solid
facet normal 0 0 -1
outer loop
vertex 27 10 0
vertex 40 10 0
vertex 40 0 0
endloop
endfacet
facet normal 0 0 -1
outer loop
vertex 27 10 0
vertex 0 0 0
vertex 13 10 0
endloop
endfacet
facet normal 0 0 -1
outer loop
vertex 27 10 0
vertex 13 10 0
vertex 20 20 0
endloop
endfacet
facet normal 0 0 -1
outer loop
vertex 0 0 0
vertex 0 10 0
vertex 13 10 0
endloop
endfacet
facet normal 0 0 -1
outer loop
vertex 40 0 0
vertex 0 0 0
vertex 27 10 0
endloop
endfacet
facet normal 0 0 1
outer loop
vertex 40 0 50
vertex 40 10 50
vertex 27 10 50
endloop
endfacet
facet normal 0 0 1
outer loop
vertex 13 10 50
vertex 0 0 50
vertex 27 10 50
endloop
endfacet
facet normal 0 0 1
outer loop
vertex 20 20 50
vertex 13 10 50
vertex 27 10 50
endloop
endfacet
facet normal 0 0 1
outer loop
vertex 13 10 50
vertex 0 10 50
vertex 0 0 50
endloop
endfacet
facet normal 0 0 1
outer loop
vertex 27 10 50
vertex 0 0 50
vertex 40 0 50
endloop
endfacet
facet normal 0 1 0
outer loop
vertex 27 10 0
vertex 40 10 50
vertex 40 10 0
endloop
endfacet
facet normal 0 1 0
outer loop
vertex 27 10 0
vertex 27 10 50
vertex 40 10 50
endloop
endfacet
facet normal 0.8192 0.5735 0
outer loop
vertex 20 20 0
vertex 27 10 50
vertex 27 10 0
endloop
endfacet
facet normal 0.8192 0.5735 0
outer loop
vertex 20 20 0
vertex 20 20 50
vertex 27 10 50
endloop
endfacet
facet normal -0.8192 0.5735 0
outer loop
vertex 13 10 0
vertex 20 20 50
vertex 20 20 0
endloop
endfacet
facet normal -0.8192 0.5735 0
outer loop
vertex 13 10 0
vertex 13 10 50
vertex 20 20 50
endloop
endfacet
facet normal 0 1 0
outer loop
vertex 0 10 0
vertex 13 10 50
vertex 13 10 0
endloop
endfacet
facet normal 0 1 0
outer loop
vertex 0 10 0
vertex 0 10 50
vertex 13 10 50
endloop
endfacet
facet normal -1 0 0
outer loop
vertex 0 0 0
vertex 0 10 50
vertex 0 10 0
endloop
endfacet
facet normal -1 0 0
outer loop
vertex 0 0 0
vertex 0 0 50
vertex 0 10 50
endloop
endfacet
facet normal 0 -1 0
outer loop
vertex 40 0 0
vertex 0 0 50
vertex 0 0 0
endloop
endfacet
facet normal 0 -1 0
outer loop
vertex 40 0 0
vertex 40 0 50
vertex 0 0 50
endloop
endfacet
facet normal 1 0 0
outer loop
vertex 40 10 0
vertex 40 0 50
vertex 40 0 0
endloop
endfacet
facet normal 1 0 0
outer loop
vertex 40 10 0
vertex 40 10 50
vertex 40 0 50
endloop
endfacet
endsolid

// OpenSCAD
$fn = 32;

// ----------------------------------------------------------------------
// V guide rail: vrib, 40 mm wide
// ----------------------------------------------------------------------

// --- parameters (mm) ---
rail_w = 40;              // rail width, X
base_t = 10;              // base plate thickness
v_depth = 10;             // V feature depth / height
v_half_w = 7;             // half width of the V at the base face
plate_t = 50;             // rail length, Z (the extrusion height)

profile = [[0, 0], [40, 0], [40, 10], [27, 10], [20, 20], [13, 10], [0, 10]];  // primary outline, 7 points, counter clockwise

// --- the one profile operation ---
linear_extrude(height = plate_t) polygon(points = profile);
